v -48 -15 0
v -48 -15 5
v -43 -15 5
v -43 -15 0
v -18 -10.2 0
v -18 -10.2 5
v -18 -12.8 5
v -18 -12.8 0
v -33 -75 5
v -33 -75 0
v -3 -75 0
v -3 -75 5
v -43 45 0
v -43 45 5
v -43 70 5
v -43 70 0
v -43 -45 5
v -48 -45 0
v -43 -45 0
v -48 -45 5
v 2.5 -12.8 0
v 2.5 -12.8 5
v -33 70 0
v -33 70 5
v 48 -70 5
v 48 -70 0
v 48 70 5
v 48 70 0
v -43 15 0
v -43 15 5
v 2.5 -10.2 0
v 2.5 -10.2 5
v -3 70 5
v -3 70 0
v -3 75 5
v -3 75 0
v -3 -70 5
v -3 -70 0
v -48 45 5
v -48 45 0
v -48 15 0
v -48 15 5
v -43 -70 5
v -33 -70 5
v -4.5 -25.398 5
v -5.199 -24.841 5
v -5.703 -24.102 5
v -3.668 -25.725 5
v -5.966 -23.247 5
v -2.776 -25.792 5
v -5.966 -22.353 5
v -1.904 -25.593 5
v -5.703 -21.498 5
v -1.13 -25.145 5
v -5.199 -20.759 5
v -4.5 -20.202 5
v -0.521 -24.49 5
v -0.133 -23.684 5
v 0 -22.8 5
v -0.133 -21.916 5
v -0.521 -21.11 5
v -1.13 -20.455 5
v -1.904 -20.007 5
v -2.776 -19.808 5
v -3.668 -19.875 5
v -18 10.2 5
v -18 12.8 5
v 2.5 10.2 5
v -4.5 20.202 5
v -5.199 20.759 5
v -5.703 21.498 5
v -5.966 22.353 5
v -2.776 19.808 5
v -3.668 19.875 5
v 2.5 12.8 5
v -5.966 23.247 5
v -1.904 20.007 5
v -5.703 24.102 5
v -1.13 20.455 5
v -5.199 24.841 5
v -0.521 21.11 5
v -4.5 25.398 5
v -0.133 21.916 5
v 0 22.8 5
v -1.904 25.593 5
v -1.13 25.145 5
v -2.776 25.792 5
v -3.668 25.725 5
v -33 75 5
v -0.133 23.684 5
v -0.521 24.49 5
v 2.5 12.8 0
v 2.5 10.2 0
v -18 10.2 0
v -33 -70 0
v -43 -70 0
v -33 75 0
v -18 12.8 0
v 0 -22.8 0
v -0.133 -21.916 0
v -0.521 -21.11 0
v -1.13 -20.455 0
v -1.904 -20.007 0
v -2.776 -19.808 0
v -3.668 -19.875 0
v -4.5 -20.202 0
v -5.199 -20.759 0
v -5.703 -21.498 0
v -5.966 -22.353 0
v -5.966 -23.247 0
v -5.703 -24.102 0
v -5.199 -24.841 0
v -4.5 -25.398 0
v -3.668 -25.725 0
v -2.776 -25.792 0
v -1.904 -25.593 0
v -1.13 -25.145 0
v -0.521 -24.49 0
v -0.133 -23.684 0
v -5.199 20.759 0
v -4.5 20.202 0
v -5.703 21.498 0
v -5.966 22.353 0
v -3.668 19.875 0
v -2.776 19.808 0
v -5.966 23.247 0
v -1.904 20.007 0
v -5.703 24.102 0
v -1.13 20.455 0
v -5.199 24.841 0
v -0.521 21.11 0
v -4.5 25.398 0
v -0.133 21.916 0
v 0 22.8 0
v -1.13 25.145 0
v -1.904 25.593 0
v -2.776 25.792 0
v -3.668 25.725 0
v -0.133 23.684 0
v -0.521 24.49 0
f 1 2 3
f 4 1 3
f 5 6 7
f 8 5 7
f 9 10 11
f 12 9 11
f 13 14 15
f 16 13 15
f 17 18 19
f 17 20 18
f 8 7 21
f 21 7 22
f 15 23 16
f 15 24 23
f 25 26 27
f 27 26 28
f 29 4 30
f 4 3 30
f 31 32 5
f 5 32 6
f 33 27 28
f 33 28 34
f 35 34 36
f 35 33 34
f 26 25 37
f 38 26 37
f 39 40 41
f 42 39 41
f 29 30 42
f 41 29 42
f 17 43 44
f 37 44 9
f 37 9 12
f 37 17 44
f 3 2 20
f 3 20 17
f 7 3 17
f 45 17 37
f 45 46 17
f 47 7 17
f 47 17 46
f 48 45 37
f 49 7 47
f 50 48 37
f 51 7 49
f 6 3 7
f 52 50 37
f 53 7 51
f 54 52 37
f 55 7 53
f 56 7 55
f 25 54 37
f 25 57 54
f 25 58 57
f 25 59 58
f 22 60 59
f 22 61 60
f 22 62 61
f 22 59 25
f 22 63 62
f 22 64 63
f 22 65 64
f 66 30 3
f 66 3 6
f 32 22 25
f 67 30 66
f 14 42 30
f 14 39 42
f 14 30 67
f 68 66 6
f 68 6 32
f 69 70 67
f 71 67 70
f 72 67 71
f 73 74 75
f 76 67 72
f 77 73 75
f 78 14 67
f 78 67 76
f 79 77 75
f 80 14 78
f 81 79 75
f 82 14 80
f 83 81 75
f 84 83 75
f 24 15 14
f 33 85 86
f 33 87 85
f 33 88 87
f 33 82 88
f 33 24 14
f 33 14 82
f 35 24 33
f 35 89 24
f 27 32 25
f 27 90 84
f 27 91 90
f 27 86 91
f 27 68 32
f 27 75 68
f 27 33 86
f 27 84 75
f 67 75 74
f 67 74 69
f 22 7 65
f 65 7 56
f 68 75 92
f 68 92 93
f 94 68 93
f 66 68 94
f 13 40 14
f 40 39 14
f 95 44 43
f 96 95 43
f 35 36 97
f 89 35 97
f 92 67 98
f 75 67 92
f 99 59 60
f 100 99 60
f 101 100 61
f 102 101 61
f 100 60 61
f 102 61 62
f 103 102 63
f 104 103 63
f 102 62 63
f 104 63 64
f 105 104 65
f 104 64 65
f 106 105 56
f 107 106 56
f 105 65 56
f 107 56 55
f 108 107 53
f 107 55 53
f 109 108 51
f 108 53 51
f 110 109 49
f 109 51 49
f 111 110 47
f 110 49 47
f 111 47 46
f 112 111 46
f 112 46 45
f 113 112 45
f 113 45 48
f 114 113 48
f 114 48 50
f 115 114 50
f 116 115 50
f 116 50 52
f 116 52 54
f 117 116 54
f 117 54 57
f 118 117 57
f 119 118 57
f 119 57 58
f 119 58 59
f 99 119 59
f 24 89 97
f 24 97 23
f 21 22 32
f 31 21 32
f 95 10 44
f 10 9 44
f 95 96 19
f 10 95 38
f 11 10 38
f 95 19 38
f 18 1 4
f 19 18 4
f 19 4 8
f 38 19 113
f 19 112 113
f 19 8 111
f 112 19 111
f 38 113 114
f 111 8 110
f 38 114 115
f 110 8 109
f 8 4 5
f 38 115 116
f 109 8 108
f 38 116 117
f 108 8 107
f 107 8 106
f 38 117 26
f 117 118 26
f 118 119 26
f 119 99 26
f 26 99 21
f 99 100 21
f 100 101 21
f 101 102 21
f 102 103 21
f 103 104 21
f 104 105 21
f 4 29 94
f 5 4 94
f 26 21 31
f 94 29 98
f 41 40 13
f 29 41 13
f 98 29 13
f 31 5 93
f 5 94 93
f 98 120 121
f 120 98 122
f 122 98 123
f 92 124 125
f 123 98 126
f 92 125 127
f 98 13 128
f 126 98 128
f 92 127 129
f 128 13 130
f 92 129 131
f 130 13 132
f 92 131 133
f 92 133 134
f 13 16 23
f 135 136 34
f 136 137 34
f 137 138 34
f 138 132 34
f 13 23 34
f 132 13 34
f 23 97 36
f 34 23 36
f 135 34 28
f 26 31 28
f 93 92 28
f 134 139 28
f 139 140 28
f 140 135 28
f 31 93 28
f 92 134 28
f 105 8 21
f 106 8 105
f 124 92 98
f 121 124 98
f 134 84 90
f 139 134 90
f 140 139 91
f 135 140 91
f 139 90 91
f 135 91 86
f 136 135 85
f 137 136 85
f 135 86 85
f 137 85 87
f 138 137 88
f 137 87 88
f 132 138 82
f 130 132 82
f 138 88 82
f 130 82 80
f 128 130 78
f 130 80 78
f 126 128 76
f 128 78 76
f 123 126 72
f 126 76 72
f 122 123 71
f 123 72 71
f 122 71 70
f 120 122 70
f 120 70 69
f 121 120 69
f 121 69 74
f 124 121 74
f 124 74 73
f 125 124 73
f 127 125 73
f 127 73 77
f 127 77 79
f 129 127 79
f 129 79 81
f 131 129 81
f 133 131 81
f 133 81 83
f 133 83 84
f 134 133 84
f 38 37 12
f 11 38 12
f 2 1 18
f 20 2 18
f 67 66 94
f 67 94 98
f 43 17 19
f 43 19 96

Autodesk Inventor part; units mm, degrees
sketch "Sketch1" plane through (0, 0, 0) normal (0, 0, 1) x (1, 0, 0)
  line L0 (0, 2.8582) -> (0, -2.8582) construction
  line L1 (-5.7775, 0) -> (5.7775, 0) construction
  line L2 (-48, -75) -> (48, -75)
  line L3 (48, -75) -> (48, 75)
  line L4 (48, 75) -> (-48, 75)
  line L5 (-48, 75) -> (-48, -75)
  line L6 (-48, -75) -> (48, 75) construction
  line L7 (48, -75) -> (-48, 75) construction
  point P0 (0, 0)
  point P1 (0, 0)
  dimension "d0" = 96
  dimension "d1" = 150
extrude "Extrusion1" add sketch "Sketch1" along normal blind 5
sketch "Sketch2" plane through (0, 0, 5) normal (0, 0, 1) x (1, 0, 0)
  line L0 (-48, 75) -> (-48, -75) projected
  line L1 (-48, 0) -> (-48, -15)
  line L2 (-48, -15) -> (-48, 15)
  line L3 (-48, 15) -> (-48, 45)
  line L4 (-48, 45) -> (-48, 75)
  line L5 (-48, -15) -> (-48, -45)
  line L6 (-48, -45) -> (-48, -75)
  line L7 (-48, -15) -> (-43, -15)
  line L8 (-43, -15) -> (-43, 15)
  line L9 (-43, 15) -> (-48, 15)
  line L10 (-48, 15) -> (-48, -15)
  line L11 (48, 75) -> (-48, 75) projected
  line L12 (-48, 45) -> (-43, 45)
  line L13 (-43, 45) -> (-43, 75)
  line L14 (-43, 75) -> (-48, 75)
  line L15 (-48, 75) -> (-48, 45)
  line L16 (-48, -45) -> (-43, -45)
  line L17 (-43, -45) -> (-43, -75)
  line L18 (-43, -75) -> (-48, -75)
  line L19 (-48, -75) -> (-48, -45)
  line L20 (-48, -75) -> (-33, -75)
  line L21 (-33, -75) -> (-33, -67)
  line L22 (-33, -67) -> (-48, -67)
  line L23 (-48, -67) -> (-48, -75)
  line L24 (-33, -75) -> (-3, -75)
  line L25 (-48, -75) -> (48, -75) projected
  line L26 (-3, -75) -> (27, -75)
  line L27 (-3, -75) -> (48, -75)
  line L28 (48, -75) -> (48, -67)
  line L29 (48, -67) -> (-3, -67)
  line L30 (-3, -67) -> (-3, -75)
  line L31 (-48, 75) -> (-33, 75)
  line L32 (-33, 75) -> (-33, 70)
  line L33 (-33, 70) -> (-48, 70)
  line L34 (-48, 70) -> (-48, 75)
  line L35 (48, -75) -> (48, 75) projected
  line L36 (-3, 75) -> (48, 75)
  line L37 (48, 75) -> (48, 70)
  line L38 (48, 70) -> (-3, 70)
  line L39 (-3, 70) -> (-3, 75)
  line L40 (-48, -75) -> (-33, -75)
  line L41 (-33, -75) -> (-33, -70)
  line L42 (-33, -70) -> (-48, -70)
  line L43 (-48, -70) -> (-48, -75)
  line L44 (-3, -75) -> (48, -75)
  line L45 (48, -75) -> (48, -70)
  line L46 (48, -70) -> (-3, -70)
  line L47 (-3, -70) -> (-3, -75)
  point P0 (0, 0)
  point P1 (-43, 70)
  point P2 (-33, 75)
  point P3 (-43, -67)
  point P4 (-43, -70)
  dimension "d4" = 15
  dimension "d5" = 30
  dimension "d6" = 30
  dimension "d7" = 30
  dimension "d8" = 30
  dimension "d9" = 5
  dimension "d10" = 15
  dimension "d12" = 30
  dimension "d13" = 30
  dimension "d14" = 51
  dimension "d15" = 5
  dimension "d18" = 15
  dimension "d23" = 8
  dimension "d24" = 5
extrude "Extrusion2" cut sketch "Sketch2" against normal blind 8 contours L11 L13 L33 L0 | L33 L13 L12 L0 | L11 L32 L33 L13 | L9 L8 L7 L0 | L11 L35 L38 L39 | L16 L17 L22 L0 | L22 L17 L42 L0 | L28 L25 L30 L46 | L42 L17 L18 L0 | L42 L21 L20 L17
sketch "Sketch4" plane through (0, 0, 5) normal (0, 0, 1) x (1, 0, 0)
  line L0 (-43, 15) -> (-43, -15) projected
  line L1 (-43, 0) -> (-18, 0)
  line L2 (-18, 0) -> (-18, -12.8)
  line L3 (-18, -12.8) -> (2.5, -12.8)
  line L4 (2.5, -12.8) -> (2.5, -10.2)
  line L5 (2.5, -10.2) -> (-18, -10.2)
  line L6 (-18, 0) -> (-18, 12.8)
  line L7 (-18, 12.8) -> (2.5, 12.8)
  line L8 (2.5, 12.8) -> (2.5, 10.2)
  line L9 (2.5, 10.2) -> (-18, 10.2)
  circle A0 centre (-3, -22.8) radius 3
  circle A1 centre (-3, 22.8) radius 3
  point P0 (0, 0)
  dimension "d25" = 25
  dimension "d26" = 12.8
  dimension "d27" = 20.5
  dimension "d28" = 2.6
  dimension "d29" = 12.8
  dimension "d30" = 20.5
  dimension "d31" = 2.6
  dimension "d36" = 6
  dimension "d37" = 6
  dimension "d39" = 15
  dimension "d40" = 10
  dimension "d41" = 15
  dimension "d42" = 10
extrude "Extrusion4" cut sketch "Sketch4" against normal blind 10
properties part number "Plaat voor" material "S235"
